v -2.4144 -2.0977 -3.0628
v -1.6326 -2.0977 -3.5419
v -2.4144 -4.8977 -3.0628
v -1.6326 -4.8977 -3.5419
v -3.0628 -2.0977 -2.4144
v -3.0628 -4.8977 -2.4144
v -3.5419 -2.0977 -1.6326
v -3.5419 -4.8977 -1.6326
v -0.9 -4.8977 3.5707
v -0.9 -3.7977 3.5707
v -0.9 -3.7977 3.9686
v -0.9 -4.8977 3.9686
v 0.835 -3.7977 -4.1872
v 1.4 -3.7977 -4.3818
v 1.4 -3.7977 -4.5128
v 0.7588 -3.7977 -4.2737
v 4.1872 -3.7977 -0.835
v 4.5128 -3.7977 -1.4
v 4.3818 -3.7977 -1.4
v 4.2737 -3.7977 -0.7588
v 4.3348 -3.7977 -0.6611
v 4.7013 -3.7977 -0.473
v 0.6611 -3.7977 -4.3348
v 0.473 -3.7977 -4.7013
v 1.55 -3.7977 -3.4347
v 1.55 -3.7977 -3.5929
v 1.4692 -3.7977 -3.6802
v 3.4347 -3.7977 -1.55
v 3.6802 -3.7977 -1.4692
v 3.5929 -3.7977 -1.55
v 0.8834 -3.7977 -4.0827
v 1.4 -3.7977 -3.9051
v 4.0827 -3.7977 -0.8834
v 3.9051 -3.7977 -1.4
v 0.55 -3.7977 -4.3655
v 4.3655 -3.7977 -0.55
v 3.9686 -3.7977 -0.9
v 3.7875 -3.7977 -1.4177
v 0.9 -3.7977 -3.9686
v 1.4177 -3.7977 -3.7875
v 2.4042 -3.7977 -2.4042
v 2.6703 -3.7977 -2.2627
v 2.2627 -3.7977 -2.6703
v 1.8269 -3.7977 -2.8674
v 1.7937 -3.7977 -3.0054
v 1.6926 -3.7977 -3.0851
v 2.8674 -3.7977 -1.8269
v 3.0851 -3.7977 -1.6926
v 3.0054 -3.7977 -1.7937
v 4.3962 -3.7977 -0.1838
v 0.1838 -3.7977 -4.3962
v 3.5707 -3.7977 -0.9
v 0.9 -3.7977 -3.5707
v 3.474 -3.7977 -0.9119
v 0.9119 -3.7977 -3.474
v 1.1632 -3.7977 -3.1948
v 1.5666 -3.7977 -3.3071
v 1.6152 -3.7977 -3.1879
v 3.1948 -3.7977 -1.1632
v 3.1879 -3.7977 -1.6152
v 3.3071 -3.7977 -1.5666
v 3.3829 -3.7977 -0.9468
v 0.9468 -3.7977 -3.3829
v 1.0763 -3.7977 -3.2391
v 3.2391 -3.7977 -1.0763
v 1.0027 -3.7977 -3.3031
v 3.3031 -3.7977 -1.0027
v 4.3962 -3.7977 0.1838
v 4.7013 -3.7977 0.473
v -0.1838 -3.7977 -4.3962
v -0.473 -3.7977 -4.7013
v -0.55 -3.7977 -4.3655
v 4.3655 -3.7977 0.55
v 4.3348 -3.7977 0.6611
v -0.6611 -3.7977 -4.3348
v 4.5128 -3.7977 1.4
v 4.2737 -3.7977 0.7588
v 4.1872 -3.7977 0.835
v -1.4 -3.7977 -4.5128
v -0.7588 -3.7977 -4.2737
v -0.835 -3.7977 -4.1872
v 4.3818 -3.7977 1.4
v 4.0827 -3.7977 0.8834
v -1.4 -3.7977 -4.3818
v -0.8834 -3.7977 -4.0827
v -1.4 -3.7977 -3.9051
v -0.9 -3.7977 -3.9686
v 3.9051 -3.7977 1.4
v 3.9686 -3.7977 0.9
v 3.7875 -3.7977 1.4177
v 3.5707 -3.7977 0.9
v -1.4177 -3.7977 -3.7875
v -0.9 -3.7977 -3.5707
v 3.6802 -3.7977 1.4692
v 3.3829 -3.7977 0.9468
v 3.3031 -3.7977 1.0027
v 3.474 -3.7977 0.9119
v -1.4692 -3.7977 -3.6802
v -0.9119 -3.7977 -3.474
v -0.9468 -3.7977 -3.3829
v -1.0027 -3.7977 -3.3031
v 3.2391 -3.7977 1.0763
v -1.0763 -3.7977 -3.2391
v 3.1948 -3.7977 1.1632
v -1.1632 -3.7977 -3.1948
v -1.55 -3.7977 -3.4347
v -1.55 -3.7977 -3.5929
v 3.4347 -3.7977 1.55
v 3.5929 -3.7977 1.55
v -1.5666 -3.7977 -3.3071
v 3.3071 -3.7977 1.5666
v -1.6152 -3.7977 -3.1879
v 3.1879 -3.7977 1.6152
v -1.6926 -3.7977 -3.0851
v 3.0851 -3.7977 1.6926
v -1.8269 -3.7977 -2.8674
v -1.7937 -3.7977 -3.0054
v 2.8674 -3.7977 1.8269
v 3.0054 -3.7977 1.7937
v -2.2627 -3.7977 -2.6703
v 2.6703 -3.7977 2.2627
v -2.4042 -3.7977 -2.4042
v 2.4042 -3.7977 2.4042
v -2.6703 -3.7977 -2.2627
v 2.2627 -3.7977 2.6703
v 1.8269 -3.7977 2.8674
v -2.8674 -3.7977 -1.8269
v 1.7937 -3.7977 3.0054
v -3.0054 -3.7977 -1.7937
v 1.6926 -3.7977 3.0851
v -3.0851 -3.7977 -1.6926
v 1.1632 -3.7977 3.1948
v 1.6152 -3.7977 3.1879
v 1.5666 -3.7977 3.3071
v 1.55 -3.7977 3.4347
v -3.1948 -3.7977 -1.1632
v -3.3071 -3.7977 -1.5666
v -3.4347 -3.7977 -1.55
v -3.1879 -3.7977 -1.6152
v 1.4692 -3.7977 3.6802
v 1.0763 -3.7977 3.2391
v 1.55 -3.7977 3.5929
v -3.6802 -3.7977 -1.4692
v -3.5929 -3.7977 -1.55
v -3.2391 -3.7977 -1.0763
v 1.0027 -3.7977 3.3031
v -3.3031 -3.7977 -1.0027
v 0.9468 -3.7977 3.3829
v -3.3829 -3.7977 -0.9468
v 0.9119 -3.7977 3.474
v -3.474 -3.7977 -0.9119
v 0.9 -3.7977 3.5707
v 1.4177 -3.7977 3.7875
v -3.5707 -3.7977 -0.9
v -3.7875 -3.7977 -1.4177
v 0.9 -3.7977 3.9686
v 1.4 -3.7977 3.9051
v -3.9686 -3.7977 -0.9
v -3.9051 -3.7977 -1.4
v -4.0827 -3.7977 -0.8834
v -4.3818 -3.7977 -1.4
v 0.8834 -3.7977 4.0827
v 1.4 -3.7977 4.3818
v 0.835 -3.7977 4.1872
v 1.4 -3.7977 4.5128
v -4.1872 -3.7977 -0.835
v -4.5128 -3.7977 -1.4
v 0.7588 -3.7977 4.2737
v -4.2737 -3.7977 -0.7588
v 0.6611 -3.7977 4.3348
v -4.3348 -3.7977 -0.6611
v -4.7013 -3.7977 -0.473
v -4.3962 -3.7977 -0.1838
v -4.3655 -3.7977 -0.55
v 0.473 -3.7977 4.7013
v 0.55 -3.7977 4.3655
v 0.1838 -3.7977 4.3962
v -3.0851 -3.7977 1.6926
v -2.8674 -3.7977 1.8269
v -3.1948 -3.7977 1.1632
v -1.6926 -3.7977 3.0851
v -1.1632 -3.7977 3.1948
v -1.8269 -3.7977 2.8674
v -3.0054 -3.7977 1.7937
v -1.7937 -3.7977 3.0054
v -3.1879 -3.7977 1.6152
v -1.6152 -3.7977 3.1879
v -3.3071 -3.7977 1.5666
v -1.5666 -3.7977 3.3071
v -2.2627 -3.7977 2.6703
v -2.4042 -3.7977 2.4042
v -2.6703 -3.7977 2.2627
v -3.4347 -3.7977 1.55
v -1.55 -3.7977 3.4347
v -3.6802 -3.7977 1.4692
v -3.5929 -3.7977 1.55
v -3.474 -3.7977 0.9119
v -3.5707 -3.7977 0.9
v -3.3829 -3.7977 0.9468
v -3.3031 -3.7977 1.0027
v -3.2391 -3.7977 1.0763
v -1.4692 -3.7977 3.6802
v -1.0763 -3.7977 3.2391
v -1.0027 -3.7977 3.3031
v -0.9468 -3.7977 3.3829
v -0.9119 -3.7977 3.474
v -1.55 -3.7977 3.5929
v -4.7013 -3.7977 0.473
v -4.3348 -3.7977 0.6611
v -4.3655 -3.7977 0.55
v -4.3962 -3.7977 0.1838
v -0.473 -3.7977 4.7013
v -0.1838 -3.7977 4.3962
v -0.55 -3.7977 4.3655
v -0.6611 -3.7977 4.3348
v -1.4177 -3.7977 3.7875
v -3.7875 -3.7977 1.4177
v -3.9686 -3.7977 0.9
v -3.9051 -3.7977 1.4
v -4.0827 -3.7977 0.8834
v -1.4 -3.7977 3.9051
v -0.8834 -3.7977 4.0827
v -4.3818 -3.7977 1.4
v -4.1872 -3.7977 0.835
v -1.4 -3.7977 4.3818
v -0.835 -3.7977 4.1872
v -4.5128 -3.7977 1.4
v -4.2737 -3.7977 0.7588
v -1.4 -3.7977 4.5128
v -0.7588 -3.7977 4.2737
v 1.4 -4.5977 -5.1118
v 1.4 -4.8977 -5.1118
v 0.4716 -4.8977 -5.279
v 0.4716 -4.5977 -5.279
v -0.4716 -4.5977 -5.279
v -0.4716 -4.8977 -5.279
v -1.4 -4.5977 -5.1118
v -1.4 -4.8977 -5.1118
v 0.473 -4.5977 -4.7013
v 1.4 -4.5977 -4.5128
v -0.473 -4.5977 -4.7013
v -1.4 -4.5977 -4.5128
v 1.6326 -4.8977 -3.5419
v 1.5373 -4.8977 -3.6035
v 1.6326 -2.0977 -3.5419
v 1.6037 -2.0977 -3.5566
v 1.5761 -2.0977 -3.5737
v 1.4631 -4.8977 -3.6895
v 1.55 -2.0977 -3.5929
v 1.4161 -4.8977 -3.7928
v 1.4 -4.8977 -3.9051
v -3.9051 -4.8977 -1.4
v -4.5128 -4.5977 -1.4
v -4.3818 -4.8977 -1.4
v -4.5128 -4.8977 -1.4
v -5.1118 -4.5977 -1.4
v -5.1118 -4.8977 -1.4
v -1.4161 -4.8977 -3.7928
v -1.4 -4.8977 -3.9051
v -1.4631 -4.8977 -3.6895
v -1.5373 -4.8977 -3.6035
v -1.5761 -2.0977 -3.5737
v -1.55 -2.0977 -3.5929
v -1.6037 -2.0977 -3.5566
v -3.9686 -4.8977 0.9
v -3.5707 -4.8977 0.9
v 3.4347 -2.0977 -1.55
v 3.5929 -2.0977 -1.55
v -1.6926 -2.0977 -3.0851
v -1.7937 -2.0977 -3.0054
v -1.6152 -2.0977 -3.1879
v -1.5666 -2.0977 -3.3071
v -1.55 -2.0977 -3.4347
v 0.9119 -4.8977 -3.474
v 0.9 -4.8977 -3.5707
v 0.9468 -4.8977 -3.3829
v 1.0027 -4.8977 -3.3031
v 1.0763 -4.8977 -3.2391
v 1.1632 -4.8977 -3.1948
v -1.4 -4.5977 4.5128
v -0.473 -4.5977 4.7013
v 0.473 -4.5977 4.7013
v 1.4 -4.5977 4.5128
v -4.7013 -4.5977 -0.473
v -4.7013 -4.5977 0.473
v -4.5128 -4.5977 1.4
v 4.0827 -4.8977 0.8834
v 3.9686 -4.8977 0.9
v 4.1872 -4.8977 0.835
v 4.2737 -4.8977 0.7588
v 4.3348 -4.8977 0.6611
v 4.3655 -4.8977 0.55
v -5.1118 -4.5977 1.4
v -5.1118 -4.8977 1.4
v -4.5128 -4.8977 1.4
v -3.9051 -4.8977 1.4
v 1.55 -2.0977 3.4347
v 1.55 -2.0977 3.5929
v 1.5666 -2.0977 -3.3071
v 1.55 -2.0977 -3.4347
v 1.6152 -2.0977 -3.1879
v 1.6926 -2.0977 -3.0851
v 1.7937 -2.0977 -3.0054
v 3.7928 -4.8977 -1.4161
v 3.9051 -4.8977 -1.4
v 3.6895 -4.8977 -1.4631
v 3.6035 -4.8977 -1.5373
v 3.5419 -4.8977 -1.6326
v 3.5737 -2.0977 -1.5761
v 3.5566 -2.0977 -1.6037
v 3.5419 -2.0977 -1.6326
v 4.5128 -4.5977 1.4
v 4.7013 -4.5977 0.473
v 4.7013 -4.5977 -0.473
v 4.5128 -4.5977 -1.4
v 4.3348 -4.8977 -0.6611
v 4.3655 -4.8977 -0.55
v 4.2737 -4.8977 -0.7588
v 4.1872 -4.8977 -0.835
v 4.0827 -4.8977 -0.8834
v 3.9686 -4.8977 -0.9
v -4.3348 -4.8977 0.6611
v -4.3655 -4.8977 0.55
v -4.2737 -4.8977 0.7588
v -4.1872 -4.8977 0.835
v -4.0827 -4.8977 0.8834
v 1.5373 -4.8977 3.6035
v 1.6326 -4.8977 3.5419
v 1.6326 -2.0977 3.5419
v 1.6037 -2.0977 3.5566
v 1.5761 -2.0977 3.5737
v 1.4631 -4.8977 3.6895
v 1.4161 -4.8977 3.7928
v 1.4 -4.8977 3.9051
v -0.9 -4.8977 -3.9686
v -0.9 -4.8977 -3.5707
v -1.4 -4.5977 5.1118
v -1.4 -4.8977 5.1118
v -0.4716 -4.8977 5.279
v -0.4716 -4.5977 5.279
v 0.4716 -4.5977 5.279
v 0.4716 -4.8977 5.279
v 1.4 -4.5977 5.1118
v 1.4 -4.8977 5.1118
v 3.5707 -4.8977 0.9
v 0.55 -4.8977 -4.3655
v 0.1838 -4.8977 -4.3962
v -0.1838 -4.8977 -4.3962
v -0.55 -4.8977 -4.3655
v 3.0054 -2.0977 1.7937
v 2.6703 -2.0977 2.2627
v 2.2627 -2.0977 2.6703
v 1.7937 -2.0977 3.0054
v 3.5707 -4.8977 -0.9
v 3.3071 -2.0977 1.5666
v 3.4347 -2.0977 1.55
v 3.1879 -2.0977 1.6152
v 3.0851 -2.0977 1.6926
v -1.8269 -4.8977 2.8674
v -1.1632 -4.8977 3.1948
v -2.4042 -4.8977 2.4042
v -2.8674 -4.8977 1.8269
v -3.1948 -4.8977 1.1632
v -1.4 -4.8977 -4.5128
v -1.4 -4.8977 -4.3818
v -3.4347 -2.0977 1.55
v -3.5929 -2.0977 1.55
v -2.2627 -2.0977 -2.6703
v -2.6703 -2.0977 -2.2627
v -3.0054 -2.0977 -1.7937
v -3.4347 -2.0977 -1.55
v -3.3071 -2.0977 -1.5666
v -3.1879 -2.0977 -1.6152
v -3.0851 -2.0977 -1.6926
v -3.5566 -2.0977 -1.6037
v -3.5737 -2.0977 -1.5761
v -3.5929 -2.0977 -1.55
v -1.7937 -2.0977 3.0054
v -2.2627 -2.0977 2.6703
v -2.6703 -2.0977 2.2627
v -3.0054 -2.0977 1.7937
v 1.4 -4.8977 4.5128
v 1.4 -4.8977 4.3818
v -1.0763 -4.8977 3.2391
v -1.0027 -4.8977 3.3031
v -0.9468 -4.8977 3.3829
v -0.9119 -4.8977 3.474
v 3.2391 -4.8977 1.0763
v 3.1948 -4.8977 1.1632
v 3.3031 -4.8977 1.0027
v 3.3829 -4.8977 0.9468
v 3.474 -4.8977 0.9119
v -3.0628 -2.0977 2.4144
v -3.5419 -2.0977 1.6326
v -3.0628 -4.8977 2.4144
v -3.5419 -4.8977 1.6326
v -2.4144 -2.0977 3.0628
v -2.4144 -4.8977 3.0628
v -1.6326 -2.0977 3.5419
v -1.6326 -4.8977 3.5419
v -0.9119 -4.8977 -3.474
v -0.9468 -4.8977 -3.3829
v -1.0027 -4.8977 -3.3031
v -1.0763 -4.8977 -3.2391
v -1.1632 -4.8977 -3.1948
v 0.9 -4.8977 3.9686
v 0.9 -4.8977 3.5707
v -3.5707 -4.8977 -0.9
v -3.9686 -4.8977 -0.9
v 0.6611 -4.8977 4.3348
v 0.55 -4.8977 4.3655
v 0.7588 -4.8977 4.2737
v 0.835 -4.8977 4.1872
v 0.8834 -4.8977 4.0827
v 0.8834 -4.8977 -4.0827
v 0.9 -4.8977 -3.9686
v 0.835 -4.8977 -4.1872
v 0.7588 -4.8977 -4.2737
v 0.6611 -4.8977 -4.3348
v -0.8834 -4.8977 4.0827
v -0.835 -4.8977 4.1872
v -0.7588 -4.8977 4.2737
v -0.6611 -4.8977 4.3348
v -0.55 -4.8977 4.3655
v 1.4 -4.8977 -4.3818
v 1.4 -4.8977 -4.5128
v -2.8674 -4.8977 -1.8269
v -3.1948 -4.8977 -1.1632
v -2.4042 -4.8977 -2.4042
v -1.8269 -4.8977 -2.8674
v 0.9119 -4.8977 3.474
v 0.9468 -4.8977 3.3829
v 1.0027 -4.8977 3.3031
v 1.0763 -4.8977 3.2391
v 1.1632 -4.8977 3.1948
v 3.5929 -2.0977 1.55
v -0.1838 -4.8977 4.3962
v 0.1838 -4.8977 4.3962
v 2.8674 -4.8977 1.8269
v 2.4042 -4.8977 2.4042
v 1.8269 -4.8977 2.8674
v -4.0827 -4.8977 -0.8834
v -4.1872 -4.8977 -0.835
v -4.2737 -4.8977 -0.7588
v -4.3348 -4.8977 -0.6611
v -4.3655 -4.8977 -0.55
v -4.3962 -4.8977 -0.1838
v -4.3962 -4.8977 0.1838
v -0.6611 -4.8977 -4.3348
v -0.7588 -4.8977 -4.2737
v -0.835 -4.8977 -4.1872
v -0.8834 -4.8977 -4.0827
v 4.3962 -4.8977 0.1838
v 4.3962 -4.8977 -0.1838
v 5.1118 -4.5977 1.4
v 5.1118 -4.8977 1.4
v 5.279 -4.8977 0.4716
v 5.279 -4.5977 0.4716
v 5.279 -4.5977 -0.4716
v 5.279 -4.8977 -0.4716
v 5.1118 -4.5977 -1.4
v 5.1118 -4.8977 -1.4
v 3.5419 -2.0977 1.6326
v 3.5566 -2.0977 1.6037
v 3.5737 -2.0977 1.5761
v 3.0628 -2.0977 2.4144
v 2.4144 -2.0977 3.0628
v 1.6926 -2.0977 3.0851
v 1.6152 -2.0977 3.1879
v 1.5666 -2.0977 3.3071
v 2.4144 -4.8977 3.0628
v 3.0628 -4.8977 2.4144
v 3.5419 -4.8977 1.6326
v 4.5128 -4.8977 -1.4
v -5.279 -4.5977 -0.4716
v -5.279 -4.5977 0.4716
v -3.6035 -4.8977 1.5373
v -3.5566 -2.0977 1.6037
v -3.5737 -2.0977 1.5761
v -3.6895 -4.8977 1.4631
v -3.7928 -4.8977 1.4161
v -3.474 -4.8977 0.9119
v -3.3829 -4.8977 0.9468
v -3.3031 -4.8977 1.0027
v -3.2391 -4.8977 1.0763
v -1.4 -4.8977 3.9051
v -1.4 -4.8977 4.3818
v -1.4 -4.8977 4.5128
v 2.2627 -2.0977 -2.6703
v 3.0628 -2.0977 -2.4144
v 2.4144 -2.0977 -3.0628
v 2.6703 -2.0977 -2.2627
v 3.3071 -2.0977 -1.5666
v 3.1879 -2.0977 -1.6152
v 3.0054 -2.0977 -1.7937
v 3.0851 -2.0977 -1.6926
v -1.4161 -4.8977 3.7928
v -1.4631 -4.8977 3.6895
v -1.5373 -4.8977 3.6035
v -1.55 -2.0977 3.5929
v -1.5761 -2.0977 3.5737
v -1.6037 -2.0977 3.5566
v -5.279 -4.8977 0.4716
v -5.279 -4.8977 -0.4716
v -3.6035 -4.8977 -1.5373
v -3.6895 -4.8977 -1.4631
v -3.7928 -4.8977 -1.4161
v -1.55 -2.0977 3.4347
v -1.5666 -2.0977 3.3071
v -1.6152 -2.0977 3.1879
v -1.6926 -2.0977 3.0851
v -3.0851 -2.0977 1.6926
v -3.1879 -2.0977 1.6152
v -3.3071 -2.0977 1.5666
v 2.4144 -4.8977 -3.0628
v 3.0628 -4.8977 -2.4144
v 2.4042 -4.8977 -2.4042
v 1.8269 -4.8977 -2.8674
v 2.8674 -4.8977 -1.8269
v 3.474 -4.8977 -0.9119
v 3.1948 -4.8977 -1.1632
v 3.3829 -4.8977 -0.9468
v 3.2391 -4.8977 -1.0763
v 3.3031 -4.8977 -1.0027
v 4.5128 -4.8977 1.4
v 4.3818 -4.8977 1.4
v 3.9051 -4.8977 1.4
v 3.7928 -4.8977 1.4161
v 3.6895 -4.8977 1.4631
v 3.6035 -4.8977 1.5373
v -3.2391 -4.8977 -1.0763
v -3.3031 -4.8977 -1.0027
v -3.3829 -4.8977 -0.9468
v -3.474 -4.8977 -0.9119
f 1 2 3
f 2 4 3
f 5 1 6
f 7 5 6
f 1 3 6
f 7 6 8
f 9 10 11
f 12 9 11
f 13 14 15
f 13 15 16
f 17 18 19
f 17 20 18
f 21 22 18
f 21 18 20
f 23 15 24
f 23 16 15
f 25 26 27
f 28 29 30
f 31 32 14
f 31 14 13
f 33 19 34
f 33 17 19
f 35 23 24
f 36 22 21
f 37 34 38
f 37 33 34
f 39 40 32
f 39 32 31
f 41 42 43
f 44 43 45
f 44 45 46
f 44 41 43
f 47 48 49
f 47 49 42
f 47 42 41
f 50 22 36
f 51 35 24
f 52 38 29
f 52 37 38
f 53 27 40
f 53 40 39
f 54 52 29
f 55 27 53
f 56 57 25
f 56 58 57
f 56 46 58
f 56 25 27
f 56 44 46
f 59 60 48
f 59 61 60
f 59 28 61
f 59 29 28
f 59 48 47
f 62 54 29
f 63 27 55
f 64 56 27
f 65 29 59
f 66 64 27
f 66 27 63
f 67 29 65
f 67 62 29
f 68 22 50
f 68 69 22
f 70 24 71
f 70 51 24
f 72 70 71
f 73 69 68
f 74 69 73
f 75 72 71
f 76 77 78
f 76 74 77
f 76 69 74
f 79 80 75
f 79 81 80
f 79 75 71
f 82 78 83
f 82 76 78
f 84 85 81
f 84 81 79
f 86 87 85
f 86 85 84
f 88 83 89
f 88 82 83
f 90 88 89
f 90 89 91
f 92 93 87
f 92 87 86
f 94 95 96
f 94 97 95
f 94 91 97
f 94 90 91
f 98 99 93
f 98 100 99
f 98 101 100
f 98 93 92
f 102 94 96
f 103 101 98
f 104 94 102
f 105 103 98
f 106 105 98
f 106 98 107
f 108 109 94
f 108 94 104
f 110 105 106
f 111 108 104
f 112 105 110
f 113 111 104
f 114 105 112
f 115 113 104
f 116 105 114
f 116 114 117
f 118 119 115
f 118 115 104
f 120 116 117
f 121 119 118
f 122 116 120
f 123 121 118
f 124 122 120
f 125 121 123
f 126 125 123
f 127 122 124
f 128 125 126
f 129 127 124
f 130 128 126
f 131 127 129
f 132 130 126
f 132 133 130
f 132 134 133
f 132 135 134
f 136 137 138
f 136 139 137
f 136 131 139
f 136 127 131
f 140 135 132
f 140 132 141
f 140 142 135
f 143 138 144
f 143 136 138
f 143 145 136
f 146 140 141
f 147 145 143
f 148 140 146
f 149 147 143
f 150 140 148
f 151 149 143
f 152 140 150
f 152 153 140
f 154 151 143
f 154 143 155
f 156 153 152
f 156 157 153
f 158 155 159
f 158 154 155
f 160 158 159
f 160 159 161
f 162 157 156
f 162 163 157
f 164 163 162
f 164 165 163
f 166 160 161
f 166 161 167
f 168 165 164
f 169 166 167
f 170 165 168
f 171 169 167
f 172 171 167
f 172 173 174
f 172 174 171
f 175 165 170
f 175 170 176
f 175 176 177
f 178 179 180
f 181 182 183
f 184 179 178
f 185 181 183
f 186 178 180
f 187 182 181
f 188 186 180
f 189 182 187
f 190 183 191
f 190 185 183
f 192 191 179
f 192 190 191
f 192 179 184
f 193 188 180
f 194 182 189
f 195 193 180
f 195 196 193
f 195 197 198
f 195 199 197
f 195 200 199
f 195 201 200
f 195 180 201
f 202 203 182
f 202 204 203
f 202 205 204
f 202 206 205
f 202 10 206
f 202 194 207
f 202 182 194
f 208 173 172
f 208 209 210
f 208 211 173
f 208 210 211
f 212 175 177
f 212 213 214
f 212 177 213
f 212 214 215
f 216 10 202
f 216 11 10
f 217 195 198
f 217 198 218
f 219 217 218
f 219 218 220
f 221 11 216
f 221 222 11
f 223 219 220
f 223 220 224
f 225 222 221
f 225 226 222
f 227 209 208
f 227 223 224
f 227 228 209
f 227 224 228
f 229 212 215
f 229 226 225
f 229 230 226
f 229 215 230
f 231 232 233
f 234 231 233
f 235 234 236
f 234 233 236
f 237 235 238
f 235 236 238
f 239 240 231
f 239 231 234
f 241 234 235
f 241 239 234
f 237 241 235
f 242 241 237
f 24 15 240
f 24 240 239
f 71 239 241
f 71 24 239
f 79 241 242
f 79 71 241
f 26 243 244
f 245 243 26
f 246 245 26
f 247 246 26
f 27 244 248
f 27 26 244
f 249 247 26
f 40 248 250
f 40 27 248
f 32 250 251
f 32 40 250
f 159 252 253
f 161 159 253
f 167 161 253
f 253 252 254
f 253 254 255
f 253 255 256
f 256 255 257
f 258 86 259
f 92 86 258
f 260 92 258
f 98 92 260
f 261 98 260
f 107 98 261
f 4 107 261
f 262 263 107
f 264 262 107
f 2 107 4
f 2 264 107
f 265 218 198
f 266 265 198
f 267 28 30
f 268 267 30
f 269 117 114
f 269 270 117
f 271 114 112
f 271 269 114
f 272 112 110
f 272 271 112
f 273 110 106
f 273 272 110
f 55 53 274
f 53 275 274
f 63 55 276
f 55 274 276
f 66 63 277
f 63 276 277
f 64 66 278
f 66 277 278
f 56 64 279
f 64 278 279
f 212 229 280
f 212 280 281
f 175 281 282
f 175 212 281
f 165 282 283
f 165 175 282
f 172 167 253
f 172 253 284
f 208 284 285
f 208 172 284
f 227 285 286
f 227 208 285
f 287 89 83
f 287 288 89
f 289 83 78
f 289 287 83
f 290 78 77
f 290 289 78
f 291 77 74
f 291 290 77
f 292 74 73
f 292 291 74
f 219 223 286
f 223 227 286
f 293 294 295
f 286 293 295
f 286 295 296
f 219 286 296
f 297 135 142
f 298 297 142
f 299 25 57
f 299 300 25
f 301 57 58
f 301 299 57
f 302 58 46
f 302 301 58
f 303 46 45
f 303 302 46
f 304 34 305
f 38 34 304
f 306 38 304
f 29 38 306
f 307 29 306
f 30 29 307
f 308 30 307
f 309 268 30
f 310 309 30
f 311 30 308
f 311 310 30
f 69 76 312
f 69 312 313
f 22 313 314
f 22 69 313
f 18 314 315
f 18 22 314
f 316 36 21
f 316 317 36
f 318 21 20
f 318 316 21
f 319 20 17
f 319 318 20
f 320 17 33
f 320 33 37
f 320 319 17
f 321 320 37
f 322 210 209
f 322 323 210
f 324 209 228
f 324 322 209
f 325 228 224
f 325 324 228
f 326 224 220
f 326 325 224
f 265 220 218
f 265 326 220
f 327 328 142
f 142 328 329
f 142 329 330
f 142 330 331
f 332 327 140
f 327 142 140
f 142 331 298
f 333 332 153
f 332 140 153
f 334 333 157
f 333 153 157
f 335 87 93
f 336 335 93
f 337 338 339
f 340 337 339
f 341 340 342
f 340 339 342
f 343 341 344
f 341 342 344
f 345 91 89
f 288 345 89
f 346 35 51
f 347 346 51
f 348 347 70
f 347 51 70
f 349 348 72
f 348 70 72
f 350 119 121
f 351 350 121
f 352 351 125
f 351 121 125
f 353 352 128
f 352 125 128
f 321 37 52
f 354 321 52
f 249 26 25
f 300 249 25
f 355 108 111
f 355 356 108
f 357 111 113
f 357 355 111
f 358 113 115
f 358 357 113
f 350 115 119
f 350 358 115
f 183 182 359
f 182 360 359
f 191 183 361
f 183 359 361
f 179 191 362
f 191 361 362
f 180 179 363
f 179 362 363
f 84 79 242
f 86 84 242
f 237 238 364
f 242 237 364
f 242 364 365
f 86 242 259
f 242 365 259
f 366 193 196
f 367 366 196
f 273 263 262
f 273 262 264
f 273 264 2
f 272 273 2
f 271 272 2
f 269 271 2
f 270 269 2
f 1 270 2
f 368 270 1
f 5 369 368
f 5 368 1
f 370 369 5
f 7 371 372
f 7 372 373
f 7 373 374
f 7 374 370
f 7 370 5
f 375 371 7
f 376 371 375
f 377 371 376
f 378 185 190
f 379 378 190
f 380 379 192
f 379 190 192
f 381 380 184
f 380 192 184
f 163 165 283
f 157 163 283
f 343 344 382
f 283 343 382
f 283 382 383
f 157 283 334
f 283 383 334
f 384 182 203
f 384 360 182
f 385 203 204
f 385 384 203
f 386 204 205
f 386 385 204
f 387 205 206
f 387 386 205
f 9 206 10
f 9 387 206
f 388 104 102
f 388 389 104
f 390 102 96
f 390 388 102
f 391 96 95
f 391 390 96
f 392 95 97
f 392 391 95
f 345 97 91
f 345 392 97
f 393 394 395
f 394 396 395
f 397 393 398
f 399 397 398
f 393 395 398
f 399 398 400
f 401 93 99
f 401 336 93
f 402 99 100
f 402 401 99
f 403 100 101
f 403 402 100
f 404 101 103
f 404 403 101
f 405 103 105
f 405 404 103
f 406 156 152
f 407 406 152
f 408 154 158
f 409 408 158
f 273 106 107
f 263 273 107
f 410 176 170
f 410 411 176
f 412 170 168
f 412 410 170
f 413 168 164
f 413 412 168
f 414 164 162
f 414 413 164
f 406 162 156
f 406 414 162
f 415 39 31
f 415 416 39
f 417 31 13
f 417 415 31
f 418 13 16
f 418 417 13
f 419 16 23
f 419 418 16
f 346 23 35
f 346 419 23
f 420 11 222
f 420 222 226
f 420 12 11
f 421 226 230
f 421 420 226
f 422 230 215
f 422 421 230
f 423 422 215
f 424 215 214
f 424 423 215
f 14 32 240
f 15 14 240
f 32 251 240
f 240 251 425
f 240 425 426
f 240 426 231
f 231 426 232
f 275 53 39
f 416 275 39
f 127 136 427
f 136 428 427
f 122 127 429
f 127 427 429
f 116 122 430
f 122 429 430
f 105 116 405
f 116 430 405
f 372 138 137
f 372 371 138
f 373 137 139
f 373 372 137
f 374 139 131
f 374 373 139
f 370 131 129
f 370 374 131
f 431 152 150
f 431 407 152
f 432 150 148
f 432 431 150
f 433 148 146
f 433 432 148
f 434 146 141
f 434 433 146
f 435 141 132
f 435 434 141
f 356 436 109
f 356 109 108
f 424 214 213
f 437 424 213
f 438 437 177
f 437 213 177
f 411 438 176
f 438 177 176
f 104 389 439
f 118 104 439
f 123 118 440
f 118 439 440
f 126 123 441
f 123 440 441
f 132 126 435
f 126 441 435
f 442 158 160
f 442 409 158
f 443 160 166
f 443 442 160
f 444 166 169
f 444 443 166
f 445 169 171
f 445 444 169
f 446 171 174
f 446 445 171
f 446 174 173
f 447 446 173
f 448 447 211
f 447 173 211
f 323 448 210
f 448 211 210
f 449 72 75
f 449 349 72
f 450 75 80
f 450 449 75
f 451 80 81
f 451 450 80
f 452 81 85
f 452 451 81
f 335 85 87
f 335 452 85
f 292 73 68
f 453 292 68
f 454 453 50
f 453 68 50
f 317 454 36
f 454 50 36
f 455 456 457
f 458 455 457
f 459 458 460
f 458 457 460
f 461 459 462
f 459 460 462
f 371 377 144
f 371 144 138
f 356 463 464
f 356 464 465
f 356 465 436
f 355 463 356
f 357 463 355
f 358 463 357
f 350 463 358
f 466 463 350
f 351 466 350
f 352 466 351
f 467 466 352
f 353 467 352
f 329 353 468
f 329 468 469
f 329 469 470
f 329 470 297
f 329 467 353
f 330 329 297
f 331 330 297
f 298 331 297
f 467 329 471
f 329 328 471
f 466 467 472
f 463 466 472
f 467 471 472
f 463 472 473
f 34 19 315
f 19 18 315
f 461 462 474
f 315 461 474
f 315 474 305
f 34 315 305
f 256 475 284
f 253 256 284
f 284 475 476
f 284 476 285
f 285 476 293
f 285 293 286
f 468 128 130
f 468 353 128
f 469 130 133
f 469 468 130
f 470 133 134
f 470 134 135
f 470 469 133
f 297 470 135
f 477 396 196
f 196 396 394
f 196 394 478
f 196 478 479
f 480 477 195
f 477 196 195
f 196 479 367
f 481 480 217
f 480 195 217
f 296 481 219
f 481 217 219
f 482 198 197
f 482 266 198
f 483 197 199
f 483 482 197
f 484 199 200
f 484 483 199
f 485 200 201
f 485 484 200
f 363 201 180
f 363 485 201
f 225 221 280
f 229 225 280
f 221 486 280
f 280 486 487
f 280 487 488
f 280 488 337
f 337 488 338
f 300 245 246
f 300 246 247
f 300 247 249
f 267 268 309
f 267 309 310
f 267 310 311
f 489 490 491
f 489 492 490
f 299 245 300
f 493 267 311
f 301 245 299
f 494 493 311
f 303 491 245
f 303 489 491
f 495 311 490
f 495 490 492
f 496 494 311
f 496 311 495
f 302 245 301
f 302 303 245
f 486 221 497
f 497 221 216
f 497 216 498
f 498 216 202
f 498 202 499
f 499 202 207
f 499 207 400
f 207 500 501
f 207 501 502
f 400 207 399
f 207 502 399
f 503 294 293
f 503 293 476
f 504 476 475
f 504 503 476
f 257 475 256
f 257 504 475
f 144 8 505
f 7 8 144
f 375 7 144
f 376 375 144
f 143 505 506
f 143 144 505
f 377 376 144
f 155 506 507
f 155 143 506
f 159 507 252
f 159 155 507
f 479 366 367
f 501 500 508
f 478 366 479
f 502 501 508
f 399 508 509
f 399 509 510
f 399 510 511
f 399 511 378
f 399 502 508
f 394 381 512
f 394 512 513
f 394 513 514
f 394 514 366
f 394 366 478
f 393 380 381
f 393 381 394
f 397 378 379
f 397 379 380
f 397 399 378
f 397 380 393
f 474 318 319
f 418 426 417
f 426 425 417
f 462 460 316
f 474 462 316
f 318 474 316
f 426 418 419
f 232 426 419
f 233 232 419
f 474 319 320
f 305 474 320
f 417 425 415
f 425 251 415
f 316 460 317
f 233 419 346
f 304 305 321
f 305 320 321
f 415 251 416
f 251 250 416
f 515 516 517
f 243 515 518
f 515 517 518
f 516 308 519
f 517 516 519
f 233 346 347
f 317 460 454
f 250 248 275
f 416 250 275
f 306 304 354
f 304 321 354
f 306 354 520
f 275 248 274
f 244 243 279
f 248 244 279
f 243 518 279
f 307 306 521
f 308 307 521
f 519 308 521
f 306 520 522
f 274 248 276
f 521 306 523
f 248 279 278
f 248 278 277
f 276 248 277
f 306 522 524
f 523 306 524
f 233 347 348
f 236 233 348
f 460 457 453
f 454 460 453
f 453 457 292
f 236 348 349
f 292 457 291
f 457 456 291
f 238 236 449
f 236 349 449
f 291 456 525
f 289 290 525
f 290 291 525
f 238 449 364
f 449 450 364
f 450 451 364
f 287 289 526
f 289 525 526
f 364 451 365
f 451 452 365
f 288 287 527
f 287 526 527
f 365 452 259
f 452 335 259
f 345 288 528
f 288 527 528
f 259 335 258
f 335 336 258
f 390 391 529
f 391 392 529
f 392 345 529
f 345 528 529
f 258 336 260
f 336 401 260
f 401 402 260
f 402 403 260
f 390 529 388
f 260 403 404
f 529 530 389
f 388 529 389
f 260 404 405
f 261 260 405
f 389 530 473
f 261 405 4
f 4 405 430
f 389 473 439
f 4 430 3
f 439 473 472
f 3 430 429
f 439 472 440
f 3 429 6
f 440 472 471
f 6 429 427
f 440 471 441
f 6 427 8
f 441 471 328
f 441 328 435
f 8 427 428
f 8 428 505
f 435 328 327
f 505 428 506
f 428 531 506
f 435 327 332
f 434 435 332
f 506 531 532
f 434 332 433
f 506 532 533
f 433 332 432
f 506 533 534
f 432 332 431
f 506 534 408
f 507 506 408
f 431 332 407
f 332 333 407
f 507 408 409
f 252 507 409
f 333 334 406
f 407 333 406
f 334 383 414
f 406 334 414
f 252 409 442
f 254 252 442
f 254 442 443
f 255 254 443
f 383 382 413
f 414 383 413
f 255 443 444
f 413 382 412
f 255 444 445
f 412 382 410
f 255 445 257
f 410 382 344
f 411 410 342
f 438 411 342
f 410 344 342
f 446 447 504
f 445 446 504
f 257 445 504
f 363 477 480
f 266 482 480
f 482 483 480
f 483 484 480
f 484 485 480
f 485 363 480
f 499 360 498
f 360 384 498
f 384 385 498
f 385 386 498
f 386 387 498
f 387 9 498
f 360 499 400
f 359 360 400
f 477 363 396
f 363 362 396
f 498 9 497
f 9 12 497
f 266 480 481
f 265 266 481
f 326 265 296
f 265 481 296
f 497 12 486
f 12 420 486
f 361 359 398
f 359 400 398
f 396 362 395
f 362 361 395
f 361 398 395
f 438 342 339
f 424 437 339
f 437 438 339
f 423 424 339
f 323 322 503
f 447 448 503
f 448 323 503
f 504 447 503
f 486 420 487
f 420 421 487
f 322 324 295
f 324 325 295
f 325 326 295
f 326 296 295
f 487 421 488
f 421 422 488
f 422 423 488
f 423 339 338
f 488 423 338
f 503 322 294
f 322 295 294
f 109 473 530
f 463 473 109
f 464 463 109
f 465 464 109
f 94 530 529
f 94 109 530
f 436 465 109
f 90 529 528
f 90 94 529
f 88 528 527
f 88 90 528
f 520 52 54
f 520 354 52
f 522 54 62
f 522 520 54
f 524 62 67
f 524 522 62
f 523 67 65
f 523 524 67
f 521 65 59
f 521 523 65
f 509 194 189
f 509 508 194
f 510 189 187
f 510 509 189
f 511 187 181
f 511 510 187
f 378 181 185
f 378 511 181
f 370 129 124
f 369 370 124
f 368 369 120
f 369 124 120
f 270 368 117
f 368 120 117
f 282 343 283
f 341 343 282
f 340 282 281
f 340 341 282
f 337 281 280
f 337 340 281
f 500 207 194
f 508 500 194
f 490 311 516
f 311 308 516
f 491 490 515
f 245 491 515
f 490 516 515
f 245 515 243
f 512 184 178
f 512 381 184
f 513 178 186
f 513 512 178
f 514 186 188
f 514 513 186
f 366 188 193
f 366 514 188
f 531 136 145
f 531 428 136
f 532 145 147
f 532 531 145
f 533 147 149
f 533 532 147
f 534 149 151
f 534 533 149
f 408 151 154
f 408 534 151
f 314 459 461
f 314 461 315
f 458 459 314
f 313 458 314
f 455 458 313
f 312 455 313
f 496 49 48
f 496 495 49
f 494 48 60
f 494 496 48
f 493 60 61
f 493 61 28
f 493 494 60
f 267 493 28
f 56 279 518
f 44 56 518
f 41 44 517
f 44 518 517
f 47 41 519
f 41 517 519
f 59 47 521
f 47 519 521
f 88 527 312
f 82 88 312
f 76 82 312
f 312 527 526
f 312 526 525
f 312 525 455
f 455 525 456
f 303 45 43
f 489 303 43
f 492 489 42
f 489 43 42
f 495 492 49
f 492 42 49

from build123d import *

# Parameters (mm, degrees)
SKETCH_1_R          = 3.4
EXTRUDE_1_DEPTH     = 1.1
EXTRUDE_START       = -0.362295
EXTRUDE_2_DEPTH     = 1.1
EXTRUDE_START_2     = -1.1
EXTRUDE_3_DEPTH     = 0.3
EXTRUDE_START_3     = 1.1
EXTRUDE_4_DEPTH     = 1.7
FILLET_2_R          = 0.5
FILLET_3_R          = 0.4
CUT_EXTRUDE_1_DEPTH = 8.685701009
FILLET_5_R          = 0.4


with BuildPart() as part:
    # 草图1 → 凸台-拉伸1 (new body)
    with BuildSketch(Plane.XZ.offset(4.897705057)):
        with BuildLine():
            Line((1.4, 4.38178046), (1.4, 3.640054945))
            ThreePointArc((1.4, 3.640054945), (2.757716447, 2.757716447), (3.640054945, 1.4))
            Line((3.640054945, 1.4), (4.38178046, 1.4))
            ThreePointArc((4.38178046, 1.4), (4.6, 0), (4.38178046, -1.4))
            Line((4.38178046, -1.4), (3.640054945, -1.4))
            ThreePointArc((3.640054945, -1.4), (2.757716447, -2.757716447), (1.4, -3.640054945))
            Line((1.4, -3.640054945), (1.4, -4.38178046))
            ThreePointArc((1.4, -4.38178046), (0, -4.6), (-1.4, -4.38178046))
            Line((-1.4, -4.38178046), (-1.4, -3.640054945))
            ThreePointArc((-1.4, -3.640054945), (-2.757716447, -2.757716447), (-3.640054945, -1.4))
            Line((-3.640054945, -1.4), (-4.38178046, -1.4))
            ThreePointArc((-4.38178046, -1.4), (-4.6, 0), (-4.38178046, 1.4))
            Line((-4.38178046, 1.4), (-3.640054945, 1.4))
            ThreePointArc((-3.640054945, 1.4), (-2.757716447, 2.757716447), (-1.4, 3.640054945))
            Line((-1.4, 3.640054945), (-1.4, 4.38178046))
            ThreePointArc((-1.4, 4.38178046), (0, 4.6), (1.4, 4.38178046))
        make_face()
        with Locations(Location((0, 0, 0), (0, 0, 270))):
            Circle(SKETCH_1_R, mode=Mode.SUBTRACT)
    extrude(amount=-EXTRUDE_1_DEPTH)

    # 草图2 → 凸台-拉伸2 (add)
    with BuildSketch(Plane.XZ.offset(4.16).offset(EXTRUDE_START)):
        with BuildLine():
            Line((4.276680956, 1.4), (4.512828935, 1.4))
            ThreePointArc((4.512828935, 1.4), (4.725, 0), (4.512828935, -1.4))
            Line((4.512828935, -1.4), (4.276680956, -1.4))
            ThreePointArc((4.276680956, -1.4), (4.5, 0), (4.276680956, 1.4))
        make_face()
        with BuildLine():
            Line((1.4, -4.276680956), (1.4, -4.512828935))
            ThreePointArc((1.4, -4.512828935), (0, -4.725), (-1.4, -4.512828935))
            Line((-1.4, -4.512828935), (-1.4, -4.276680956))
            ThreePointArc((-1.4, -4.276680956), (0, -4.5), (1.4, -4.276680956))
        make_face()
        with BuildLine():
            Line((-4.276680956, -1.4), (-4.512828935, -1.4))
            ThreePointArc((-4.512828935, -1.4), (-4.725, 0), (-4.512828935, 1.4))
            Line((-4.512828935, 1.4), (-4.276680956, 1.4))
            ThreePointArc((-4.276680956, 1.4), (-4.5, 0), (-4.276680956, -1.4))
        make_face()
        with BuildLine():
            Line((-1.4, 4.276680956), (-1.4, 4.512828935))
            ThreePointArc((-1.4, 4.512828935), (0, 4.725), (1.4, 4.512828935))
            Line((1.4, 4.512828935), (1.4, 4.276680956))
            ThreePointArc((1.4, 4.276680956), (0, 4.5), (-1.4, 4.276680956))
        make_face()
    extrude(amount=EXTRUDE_2_DEPTH)

    # 草图3 → 凸台-拉伸3 (add)
    with BuildSketch(Plane(origin=(0, -3.797705057, 0), x_dir=(-1, 0, 0), z_dir=(0, 1, 0)).offset(EXTRUDE_START_2)):
        with BuildLine():
            Line((4.276680956, 1.4), (5.111751168, 1.4))
            ThreePointArc((5.111751168, 1.4), (5.3, 0), (5.111751168, -1.4))
            Line((5.111751168, -1.4), (4.276680956, -1.4))
            ThreePointArc((4.276680956, -1.4), (4.5, 0), (4.276680956, 1.4))
        make_face()
        with BuildLine():
            Line((-1.4, -4.276680956), (-1.4, -5.111751168))
            ThreePointArc((-1.4, -5.111751168), (0, -5.3), (1.4, -5.111751168))
            Line((1.4, -5.111751168), (1.4, -4.276680956))
            ThreePointArc((1.4, -4.276680956), (0, -4.5), (-1.4, -4.276680956))
        make_face()
        with BuildLine():
            Line((-4.276680956, 1.4), (-5.111751168, 1.4))
            ThreePointArc((-5.111751168, 1.4), (-5.3, 0), (-5.111751168, -1.4))
            Line((-5.111751168, -1.4), (-4.276680956, -1.4))
            ThreePointArc((-4.276680956, -1.4), (-4.5, 0), (-4.276680956, 1.4))
        make_face()
        with BuildLine():
            Line((1.4, 4.276680956), (1.4, 5.111751168))
            ThreePointArc((1.4, 5.111751168), (0, 5.3), (-1.4, 5.111751168))
            Line((-1.4, 5.111751168), (-1.4, 4.276680956))
            ThreePointArc((-1.4, 4.276680956), (0, 4.5), (1.4, 4.276680956))
        make_face()
    extrude(amount=EXTRUDE_3_DEPTH)

    # 草图4 → 凸台-拉伸4 (add)
    with BuildSketch(Plane(origin=(0, -4.897705057, 0), x_dir=(-1, 0, 0), z_dir=(0, 1, 0)).offset(EXTRUDE_START_3)):
        with BuildLine():
            Line((1.55, 3.578756767), (1.55, 3.138072657))
            ThreePointArc((1.55, 3.138072657), (2.474873734, 2.474873734), (3.138072657, 1.55))
            Line((3.138072657, 1.55), (3.578756767, 1.55))
            ThreePointArc((3.578756767, 1.55), (2.757716447, 2.757716447), (1.55, 3.578756767))
        make_face()
        with BuildLine():
            Line((1.55, -3.138072657), (1.55, -3.578756767))
            ThreePointArc((1.55, -3.578756767), (2.757716447, -2.757716447), (3.578756767, -1.55))
            Line((3.578756767, -1.55), (3.138072657, -1.55))
            ThreePointArc((3.138072657, -1.55), (2.474873734, -2.474873734), (1.55, -3.138072657))
        make_face()
        with BuildLine():
            Line((-3.138072657, -1.55), (-3.578756767, -1.55))
            ThreePointArc((-3.578756767, -1.55), (-2.757716447, -2.757716447), (-1.55, -3.578756767))
            Line((-1.55, -3.578756767), (-1.55, -3.138072657))
            ThreePointArc((-1.55, -3.138072657), (-2.474873734, -2.474873734), (-3.138072657, -1.55))
        make_face()
        with BuildLine():
            Line((-1.55, 3.138072657), (-1.55, 3.578756767))
            ThreePointArc((-1.55, 3.578756767), (-2.757716447, 2.757716447), (-3.578756767, 1.55))
            Line((-3.578756767, 1.55), (-3.138072657, 1.55))
            ThreePointArc((-3.138072657, 1.55), (-2.474873734, 2.474873734), (-1.55, 3.138072657))
        make_face()
    extrude(amount=EXTRUDE_4_DEPTH)

    # 圆角2
    fillet_2_edges = [part.edges().sort_by_distance(p)[0] for p in [
        (1.55, -2.947705057, 3.138072657),
        (3.138072657, -2.947705057, 1.55),
        (3.138072657, -2.947705057, -1.55),
        (1.55, -2.947705057, -3.138072657),
        (-1.55, -2.947705057, -3.138072657),
        (-3.138072657, -2.947705057, -1.55),
        (-3.138072657, -2.947705057, 1.55),
        (-1.55, -2.947705057, 3.138072657),
    ]]
    fillet(fillet_2_edges, radius=FILLET_2_R)

    # 圆角3
    fillet_3_edges = [part.edges().sort_by_distance(p)[0] for p in [
        (-3.640054945, -4.347705057, 1.4),
        (-3.640054945, -4.347705057, -1.4),
        (-1.4, -4.347705057, -3.640054945),
        (1.4, -4.347705057, -3.640054945),
        (3.640054945, -4.347705057, -1.4),
        (3.640054945, -4.347705057, 1.4),
        (1.4, -4.347705057, 3.640054945),
        (-1.4, -4.347705057, 3.640054945),
    ]]
    fillet(fillet_3_edges, radius=FILLET_3_R)

    # 草图5 → 切除-拉伸1 (cut, through all)
    with BuildSketch(Plane(origin=(0, -3.797705057, 0), x_dir=(-1, 0, 0), z_dir=(0, 1, 0))):
        with BuildLine():
            Line((4.306971093, 0.9), (2.740001738, 0.9))
            Line((2.740001738, 0.9), (2.740001738, -0.9))
            Line((2.740001738, -0.9), (4.306971093, -0.9))
            ThreePointArc((4.306971093, -0.9), (4.4, 0), (4.306971093, 0.9))
        make_face()
        with BuildLine():
            Line((0.9, -4.306971093), (0.9, -2.740001738))
            Line((0.9, -2.740001738), (-0.9, -2.740001738))
            Line((-0.9, -2.740001738), (-0.9, -4.306971093))
            ThreePointArc((-0.9, -4.306971093), (0, -4.4), (0.9, -4.306971093))
        make_face()
        with BuildLine():
            Line((-4.306971093, -0.9), (-2.740001738, -0.9))
            Line((-2.740001738, -0.9), (-2.740001738, 0.9))
            Line((-2.740001738, 0.9), (-4.306971093, 0.9))
            ThreePointArc((-4.306971093, 0.9), (-4.4, 0), (-4.306971093, -0.9))
        make_face()
        with BuildLine():
            Line((-0.9, 4.306971093), (-0.9, 2.740001738))
            Line((-0.9, 2.740001738), (0.9, 2.740001738))
            Line((0.9, 2.740001738), (0.9, 4.306971093))
            ThreePointArc((0.9, 4.306971093), (0, 4.4), (-0.9, 4.306971093))
        make_face()
    extrude(amount=-CUT_EXTRUDE_1_DEPTH, mode=Mode.SUBTRACT)

    # 圆角5
    fillet_5_edges = [part.edges().sort_by_distance(p)[0] for p in [
        (0.9, -4.347705057, 3.278719262),
        (-0.9, -4.347705057, 3.278719262),
        (3.278719262, -4.347705057, -0.9),
        (3.278719262, -4.347705057, 0.9),
        (-0.9, -4.347705057, -3.278719262),
        (0.9, -4.347705057, -3.278719262),
        (-3.278719262, -4.347705057, 0.9),
        (-3.278719262, -4.347705057, -0.9),
        (-4.306971093, -4.347705057, -0.9),
        (-4.306971093, -4.347705057, 0.9),
        (0.9, -4.347705057, -4.306971093),
        (-0.9, -4.347705057, -4.306971093),
        (4.306971093, -4.347705057, 0.9),
        (4.306971093, -4.347705057, -0.9),
        (-0.9, -4.347705057, 4.306971093),
        (0.9, -4.347705057, 4.306971093),
    ]]
    fillet(fillet_5_edges, radius=FILLET_5_R)


solid = part.part
